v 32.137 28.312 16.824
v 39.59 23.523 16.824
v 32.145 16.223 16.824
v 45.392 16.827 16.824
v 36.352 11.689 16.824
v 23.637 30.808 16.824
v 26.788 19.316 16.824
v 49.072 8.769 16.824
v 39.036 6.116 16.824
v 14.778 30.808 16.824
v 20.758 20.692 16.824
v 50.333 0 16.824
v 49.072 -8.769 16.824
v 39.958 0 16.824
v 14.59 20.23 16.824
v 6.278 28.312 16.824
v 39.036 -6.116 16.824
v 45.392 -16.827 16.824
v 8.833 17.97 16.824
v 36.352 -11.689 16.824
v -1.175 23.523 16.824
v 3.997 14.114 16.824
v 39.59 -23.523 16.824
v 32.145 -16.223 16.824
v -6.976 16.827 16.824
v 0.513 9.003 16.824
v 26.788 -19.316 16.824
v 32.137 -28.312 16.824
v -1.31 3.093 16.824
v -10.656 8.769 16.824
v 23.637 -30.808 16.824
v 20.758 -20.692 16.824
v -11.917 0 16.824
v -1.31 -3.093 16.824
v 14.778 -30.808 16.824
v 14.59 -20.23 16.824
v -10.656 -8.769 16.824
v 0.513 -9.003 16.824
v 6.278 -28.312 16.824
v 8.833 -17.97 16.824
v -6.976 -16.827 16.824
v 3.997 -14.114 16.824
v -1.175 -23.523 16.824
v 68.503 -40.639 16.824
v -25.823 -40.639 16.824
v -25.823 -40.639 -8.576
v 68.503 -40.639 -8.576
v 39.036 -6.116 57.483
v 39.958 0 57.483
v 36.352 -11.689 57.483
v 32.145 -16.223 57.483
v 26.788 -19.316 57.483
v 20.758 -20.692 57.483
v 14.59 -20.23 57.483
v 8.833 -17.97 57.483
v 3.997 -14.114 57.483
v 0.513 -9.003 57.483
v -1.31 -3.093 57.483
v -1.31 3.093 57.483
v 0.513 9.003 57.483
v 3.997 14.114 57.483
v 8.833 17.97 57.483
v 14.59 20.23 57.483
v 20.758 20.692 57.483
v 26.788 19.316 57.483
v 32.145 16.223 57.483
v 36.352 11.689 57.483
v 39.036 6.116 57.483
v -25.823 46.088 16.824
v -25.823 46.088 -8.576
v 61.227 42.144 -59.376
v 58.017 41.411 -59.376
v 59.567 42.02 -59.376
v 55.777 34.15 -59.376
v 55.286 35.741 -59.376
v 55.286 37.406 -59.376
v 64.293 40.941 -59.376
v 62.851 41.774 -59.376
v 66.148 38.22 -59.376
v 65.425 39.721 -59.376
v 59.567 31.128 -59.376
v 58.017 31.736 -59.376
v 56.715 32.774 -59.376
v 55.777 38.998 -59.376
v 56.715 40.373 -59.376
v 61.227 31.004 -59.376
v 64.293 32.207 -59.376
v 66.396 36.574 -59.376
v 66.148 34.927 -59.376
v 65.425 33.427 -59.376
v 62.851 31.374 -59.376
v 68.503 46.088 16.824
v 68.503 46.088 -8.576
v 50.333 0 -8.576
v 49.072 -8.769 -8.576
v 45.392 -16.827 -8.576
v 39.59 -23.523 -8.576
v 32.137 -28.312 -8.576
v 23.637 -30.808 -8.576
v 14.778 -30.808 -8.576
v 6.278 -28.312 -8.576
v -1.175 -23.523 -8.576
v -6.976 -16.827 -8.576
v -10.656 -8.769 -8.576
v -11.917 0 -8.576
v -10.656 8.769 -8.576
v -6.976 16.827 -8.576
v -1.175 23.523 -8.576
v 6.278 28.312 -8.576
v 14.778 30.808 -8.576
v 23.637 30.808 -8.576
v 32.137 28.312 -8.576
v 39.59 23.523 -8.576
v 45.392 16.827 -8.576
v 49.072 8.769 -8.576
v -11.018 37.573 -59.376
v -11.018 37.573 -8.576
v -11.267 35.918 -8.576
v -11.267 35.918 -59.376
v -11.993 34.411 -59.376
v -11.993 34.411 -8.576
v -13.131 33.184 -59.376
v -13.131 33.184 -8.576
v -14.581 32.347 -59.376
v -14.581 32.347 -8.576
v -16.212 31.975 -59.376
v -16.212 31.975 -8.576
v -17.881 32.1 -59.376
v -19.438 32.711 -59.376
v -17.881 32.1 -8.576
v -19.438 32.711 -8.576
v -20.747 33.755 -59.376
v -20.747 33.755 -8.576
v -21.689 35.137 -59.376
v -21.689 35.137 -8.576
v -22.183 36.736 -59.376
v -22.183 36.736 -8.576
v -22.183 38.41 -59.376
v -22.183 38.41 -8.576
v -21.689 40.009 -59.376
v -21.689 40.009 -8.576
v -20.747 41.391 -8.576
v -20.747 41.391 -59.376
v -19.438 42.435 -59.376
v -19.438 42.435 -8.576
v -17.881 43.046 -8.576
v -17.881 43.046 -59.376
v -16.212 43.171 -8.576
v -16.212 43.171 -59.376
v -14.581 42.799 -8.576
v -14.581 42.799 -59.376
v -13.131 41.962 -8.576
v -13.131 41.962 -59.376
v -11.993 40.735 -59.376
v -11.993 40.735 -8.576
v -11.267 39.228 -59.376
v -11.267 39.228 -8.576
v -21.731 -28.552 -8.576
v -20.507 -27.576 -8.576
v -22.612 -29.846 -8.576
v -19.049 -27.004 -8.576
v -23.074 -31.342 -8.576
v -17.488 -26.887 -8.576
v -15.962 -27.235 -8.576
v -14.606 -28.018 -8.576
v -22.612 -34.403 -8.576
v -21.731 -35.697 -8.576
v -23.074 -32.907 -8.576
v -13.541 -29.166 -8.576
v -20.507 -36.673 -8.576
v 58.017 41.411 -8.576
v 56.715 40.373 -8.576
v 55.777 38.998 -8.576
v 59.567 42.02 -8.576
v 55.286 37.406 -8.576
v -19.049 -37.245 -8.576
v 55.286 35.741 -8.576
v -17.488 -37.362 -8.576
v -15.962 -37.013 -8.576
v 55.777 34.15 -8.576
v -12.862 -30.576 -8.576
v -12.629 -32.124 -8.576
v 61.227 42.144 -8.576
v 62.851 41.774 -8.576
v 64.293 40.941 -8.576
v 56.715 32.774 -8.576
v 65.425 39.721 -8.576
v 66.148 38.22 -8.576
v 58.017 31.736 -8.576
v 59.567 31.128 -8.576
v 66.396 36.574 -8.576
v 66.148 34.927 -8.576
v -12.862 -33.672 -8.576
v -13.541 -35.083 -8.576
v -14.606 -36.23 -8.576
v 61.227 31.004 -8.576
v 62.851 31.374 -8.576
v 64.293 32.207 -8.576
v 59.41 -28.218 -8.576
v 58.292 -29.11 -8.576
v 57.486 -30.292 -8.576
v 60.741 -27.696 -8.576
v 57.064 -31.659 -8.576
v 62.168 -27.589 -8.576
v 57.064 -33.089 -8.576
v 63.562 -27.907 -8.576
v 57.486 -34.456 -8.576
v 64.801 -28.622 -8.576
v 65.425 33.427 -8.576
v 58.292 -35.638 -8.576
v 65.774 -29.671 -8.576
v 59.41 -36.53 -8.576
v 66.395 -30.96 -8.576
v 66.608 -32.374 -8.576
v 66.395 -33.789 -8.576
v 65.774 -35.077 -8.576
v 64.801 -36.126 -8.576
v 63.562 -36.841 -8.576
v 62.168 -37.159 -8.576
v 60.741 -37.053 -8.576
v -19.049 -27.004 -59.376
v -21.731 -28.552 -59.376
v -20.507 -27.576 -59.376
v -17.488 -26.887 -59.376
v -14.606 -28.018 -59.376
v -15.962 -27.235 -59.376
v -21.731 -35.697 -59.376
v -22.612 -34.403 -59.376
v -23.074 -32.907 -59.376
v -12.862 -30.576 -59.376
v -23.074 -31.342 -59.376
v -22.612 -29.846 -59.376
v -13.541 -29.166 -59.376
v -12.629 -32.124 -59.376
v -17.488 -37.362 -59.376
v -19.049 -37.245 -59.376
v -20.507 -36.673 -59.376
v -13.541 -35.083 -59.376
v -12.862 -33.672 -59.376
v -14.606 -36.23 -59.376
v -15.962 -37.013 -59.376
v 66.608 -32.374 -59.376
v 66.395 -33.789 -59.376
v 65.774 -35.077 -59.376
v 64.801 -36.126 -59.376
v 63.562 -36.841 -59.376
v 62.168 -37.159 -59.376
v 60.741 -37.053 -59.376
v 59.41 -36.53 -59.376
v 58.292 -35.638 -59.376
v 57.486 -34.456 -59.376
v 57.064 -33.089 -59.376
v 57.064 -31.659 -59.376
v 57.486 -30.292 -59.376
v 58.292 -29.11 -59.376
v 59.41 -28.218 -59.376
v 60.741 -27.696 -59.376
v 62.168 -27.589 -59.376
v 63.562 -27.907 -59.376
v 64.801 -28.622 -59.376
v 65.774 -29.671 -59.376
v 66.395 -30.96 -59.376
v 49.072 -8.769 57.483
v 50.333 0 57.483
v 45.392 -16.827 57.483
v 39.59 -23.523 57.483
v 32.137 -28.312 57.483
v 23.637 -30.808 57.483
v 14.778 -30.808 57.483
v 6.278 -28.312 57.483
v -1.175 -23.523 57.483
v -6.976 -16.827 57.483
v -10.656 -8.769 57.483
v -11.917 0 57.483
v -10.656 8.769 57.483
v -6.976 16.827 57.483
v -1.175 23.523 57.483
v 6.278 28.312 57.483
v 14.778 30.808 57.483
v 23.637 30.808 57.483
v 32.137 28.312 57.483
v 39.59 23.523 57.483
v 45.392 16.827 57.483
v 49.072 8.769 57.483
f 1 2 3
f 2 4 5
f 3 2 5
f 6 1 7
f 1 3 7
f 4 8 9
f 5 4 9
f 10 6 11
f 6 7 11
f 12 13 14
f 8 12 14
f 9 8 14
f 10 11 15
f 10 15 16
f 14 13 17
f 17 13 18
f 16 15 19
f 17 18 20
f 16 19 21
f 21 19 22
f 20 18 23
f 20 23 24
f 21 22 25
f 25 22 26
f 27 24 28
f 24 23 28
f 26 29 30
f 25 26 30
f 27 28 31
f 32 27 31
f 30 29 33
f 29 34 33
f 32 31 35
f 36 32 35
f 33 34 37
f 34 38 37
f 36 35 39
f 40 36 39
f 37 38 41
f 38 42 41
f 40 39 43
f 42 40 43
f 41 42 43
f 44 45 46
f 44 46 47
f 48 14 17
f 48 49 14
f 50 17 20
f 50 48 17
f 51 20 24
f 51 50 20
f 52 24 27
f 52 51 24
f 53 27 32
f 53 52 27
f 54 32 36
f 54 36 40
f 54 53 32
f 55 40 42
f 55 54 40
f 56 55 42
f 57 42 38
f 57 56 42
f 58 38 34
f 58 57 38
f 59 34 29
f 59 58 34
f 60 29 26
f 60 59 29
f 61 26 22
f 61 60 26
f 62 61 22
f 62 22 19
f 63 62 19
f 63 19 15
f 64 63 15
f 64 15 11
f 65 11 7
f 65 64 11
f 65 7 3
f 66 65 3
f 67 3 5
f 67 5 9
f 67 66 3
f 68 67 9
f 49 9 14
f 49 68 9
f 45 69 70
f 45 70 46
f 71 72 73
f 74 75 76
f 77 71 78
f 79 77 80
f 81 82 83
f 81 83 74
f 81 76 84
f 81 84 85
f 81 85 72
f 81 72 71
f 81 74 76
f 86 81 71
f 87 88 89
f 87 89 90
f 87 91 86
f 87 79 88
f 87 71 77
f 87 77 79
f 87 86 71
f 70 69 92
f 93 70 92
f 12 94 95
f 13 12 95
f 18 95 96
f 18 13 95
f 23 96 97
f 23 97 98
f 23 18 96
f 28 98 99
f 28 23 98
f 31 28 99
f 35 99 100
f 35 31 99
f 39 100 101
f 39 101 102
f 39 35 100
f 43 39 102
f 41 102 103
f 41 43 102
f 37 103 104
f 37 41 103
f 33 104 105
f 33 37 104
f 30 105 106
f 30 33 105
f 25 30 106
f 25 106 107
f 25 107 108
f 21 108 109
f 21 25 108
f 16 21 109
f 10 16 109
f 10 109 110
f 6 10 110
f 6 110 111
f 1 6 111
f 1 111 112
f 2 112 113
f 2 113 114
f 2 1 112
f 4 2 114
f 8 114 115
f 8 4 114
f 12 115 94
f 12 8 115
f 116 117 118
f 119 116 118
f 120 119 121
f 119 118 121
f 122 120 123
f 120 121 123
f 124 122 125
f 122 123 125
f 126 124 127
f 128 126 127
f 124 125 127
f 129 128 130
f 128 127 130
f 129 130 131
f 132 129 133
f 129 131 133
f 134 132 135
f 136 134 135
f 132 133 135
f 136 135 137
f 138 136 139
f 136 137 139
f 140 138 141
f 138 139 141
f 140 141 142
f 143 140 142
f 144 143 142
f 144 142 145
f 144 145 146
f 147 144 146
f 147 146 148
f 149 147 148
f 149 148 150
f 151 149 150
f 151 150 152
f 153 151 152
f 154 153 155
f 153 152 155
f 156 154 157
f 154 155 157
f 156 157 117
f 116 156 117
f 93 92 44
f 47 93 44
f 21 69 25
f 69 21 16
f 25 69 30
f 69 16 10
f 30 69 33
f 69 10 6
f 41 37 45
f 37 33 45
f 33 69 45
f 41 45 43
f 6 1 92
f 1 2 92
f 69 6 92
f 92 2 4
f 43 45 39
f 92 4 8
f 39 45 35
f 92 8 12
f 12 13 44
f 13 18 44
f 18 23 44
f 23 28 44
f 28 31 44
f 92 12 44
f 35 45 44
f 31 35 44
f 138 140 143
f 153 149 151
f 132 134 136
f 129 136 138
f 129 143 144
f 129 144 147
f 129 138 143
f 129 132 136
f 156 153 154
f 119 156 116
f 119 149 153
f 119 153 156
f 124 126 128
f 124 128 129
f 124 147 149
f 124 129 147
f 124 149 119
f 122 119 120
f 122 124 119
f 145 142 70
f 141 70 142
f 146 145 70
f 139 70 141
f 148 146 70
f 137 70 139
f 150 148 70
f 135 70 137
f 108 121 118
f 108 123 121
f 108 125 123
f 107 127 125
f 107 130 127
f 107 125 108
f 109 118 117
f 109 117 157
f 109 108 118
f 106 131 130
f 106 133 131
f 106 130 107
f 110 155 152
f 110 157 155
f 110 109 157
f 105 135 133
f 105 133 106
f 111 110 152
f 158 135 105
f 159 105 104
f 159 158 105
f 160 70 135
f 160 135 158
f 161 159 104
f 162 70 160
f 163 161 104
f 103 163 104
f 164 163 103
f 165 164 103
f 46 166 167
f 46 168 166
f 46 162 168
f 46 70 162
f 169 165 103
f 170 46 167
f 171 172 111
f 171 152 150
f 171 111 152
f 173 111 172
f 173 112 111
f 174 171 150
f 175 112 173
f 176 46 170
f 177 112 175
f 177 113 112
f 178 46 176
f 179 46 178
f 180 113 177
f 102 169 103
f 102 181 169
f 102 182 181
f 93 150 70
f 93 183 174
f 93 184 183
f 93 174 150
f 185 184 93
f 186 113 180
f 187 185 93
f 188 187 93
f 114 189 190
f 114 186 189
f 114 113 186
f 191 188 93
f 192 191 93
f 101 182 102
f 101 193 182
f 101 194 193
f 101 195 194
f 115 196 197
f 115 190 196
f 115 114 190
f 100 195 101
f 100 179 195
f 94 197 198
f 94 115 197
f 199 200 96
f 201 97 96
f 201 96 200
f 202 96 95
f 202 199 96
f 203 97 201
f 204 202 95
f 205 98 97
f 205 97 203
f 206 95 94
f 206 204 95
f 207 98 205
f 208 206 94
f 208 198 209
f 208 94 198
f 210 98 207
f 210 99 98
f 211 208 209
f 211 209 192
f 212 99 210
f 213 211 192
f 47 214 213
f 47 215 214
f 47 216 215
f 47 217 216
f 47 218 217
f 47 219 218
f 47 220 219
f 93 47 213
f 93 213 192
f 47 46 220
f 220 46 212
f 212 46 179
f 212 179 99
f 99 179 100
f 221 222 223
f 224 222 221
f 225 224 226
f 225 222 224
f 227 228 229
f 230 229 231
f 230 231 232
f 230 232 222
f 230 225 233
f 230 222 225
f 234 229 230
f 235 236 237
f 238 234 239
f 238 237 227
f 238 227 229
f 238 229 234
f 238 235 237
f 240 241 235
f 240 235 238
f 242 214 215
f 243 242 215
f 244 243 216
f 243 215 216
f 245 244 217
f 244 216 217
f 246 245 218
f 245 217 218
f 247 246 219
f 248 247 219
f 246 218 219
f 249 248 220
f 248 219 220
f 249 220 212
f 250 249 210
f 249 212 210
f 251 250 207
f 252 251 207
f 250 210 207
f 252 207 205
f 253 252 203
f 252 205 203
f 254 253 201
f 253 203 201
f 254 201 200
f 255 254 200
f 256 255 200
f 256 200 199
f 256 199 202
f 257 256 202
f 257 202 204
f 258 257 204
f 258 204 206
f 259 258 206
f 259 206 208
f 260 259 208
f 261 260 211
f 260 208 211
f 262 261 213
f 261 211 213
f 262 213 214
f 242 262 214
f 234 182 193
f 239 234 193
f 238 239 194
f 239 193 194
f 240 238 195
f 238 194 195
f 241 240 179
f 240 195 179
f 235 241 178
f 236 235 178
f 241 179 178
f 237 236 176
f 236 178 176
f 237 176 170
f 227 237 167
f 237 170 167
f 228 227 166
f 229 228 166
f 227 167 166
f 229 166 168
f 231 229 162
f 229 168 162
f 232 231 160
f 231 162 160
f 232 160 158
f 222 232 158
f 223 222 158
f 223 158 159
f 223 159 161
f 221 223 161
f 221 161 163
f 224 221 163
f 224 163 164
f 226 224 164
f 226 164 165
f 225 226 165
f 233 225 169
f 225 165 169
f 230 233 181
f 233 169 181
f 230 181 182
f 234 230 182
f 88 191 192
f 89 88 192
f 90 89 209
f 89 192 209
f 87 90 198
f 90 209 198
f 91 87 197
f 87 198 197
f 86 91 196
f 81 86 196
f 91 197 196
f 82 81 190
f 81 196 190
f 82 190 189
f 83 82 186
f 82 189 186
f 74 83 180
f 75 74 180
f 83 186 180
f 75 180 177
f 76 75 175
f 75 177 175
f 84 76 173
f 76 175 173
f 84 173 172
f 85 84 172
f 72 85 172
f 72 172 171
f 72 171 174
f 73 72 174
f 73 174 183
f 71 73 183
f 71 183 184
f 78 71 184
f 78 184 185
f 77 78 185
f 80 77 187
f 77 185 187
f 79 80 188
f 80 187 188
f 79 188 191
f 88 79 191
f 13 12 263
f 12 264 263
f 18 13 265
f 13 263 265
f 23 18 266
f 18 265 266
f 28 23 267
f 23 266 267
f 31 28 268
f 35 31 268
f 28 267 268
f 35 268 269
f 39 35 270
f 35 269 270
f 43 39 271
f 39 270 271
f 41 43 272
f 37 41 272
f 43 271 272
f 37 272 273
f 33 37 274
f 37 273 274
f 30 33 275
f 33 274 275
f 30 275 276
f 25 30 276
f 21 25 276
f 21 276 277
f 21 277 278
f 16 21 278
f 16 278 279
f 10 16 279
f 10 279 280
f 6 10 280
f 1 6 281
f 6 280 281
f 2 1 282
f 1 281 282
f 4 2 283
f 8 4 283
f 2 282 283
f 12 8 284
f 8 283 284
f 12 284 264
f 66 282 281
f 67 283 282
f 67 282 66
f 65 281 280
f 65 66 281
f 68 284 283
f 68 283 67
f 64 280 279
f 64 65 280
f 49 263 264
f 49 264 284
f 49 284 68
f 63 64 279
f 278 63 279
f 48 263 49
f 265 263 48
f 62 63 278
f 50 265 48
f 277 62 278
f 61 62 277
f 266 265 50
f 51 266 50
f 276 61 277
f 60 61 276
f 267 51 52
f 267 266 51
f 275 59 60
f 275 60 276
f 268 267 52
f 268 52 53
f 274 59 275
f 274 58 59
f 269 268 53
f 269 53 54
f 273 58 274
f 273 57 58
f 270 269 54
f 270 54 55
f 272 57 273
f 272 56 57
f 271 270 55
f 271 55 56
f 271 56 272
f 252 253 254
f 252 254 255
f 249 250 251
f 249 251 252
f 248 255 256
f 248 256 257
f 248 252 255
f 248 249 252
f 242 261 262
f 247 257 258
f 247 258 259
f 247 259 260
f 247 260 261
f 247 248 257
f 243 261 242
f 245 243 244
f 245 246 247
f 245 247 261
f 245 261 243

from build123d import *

# Parameters (mm, degrees)
F0_W     = 10.3749409318
F0_H     = 40.6585689634
F2_W     = 94.325793907
F2_H     = 86.7265574634
F2_R     = 31.1248358339
F3_DEPTH = 25.4
F5_R     = 5.5859562954
F5_R_2   = 5.6138148753
F5_R_3   = 5.25198777
F5_R_4   = 4.7987242699
F6_DEPTH = 50.8


with BuildPart() as f1:
    # F0 (on Front) → F1 (revolve)
    with BuildSketch(Plane.XZ):
        with Locations((45.14503479, 37.1535243466)):
            Rectangle(F0_W, F0_H)
    revolve(axis=Axis((19.207669422, 0, 35.8917070553), (0, 0, -1)))


with BuildPart() as f3:
    # F2 (on face) → F3 (new body)
    with BuildSketch(Plane(origin=(0, 0, 16.8242398649), x_dir=(1, 0, 0), z_dir=(0, 0, -1))):
        with Locations((21.3397899643, -2.7243886143)):
            Rectangle(F2_W, F2_H)
        with Locations((19.207669422, 0)):
            Circle(F2_R, mode=Mode.SUBTRACT)
    extrude(amount=F3_DEPTH)

    # F5 (on face) → F6 (join)
    with BuildSketch(Plane(origin=(0, 0, -8.5757601351), x_dir=(1, 0, 0), z_dir=(0, 0, -1))):
        with Locations((60.8100071549, -36.5738496184)):
            Circle(F5_R)
        with Locations((-16.6315622628, -37.5730954111)):
            Circle(F5_R_2)
        with Locations((-17.8806204349, 32.1243181825)):
            Circle(F5_R_3)
        with Locations((61.8092529476, 32.3741286993)):
            Circle(F5_R_4)
    extrude(amount=F6_DEPTH)


solid = Compound([f1.part, f3.part])
